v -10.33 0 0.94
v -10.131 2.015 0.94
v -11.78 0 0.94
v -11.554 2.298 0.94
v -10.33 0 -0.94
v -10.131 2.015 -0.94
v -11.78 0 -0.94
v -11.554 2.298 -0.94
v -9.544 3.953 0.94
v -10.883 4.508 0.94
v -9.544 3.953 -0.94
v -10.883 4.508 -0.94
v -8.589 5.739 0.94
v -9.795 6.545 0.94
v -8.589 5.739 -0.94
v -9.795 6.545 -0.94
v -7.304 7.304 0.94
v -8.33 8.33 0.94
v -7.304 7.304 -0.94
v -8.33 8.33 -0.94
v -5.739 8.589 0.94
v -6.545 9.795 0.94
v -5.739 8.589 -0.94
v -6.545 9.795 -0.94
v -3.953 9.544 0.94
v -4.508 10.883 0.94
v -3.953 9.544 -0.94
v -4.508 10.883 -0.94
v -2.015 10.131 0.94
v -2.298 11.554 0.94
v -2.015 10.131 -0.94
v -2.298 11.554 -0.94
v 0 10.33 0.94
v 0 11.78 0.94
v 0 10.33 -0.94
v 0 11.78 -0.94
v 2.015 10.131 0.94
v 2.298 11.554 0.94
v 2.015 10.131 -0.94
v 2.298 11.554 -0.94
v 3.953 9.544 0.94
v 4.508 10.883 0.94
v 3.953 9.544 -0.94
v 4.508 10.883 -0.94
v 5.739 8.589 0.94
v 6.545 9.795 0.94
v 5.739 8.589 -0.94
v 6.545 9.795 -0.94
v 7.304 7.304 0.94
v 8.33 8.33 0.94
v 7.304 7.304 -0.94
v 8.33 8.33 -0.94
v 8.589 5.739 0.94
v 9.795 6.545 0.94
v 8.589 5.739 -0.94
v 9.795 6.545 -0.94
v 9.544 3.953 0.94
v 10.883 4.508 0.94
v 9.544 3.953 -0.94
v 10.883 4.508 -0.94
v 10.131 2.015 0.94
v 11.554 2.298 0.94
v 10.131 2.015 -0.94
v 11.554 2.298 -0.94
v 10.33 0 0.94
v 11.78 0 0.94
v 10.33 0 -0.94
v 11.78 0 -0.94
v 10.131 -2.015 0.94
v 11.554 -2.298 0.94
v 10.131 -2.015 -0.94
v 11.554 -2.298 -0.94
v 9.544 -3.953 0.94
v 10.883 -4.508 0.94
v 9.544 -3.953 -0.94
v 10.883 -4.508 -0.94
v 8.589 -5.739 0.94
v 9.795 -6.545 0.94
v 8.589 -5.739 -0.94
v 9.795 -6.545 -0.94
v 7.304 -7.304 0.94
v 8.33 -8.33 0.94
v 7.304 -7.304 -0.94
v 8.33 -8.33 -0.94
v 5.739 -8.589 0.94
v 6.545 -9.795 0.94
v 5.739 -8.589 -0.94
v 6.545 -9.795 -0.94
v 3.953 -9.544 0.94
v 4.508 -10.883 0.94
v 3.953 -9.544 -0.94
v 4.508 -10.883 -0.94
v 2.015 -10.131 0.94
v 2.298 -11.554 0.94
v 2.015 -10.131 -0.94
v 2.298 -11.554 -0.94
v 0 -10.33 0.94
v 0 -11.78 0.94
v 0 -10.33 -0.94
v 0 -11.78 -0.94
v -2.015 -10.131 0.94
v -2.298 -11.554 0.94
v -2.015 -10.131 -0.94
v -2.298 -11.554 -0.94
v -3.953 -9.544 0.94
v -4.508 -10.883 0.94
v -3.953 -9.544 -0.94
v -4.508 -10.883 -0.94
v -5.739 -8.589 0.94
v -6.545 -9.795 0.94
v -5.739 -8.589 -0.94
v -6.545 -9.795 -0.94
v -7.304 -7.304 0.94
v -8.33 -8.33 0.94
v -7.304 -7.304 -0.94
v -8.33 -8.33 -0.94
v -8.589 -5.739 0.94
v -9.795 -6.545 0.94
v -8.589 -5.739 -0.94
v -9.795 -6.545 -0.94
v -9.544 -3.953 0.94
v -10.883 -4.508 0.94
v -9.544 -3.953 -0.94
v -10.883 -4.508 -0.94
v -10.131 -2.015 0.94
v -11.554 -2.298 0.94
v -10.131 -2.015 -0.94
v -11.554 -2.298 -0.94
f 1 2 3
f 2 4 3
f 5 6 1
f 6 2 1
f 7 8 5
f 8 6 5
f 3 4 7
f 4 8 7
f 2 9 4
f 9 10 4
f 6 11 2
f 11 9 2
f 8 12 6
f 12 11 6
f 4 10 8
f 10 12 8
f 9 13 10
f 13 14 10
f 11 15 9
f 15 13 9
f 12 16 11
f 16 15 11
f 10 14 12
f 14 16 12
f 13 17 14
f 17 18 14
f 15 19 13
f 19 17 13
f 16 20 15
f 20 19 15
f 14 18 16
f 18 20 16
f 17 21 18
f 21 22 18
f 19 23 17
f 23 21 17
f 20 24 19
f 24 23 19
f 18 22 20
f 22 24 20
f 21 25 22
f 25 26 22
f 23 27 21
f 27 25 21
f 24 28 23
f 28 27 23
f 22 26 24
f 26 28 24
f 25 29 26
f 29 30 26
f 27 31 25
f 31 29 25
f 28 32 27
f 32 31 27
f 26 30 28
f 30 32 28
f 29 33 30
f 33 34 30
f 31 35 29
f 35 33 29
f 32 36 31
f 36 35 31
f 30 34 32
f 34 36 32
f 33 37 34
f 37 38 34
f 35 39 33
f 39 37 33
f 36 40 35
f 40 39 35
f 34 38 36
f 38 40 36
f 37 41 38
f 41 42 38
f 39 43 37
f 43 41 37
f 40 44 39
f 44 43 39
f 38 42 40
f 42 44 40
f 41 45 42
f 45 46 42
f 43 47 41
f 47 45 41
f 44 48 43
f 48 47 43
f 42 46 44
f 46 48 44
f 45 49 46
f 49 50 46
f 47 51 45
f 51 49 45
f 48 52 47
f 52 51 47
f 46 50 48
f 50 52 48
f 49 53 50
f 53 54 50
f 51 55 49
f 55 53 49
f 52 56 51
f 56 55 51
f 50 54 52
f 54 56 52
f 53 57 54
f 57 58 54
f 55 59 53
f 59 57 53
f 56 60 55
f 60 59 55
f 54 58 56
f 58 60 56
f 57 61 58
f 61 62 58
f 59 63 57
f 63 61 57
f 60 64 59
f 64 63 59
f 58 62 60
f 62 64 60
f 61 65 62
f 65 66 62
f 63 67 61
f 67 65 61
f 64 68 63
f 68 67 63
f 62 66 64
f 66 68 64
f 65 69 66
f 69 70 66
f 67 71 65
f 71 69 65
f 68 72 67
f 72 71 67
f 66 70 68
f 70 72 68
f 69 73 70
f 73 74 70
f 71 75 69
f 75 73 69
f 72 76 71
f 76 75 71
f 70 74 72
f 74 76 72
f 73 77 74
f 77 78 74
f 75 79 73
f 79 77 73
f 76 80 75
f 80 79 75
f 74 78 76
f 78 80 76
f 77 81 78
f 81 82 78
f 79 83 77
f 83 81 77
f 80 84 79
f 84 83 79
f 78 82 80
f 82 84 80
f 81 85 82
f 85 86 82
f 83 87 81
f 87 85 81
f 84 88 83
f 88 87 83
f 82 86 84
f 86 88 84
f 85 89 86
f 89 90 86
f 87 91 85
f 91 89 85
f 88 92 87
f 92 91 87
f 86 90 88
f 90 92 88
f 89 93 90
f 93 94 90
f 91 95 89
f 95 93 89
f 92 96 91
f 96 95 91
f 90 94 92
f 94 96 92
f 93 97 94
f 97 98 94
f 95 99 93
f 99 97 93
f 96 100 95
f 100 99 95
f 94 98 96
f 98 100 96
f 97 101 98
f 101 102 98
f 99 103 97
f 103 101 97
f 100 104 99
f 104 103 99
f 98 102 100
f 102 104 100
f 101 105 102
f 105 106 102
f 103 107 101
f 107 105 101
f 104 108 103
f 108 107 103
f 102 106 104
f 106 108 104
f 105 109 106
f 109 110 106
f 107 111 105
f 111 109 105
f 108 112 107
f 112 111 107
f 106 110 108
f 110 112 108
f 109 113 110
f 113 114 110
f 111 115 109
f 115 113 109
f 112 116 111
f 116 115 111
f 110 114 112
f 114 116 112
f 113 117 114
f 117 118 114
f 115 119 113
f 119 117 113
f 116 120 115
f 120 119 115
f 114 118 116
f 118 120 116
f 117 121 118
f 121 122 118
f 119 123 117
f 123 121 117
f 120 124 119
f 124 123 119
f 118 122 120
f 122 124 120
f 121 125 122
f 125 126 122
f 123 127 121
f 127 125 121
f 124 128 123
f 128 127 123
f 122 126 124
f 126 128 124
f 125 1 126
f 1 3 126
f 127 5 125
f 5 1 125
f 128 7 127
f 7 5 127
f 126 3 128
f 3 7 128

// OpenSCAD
// file: ../stamp_generated.scad
// AUTO-GENERATED by scripts/Export-OpenScadStl.ps1 - do not edit by hand
// Source: print-stamp-config.json

info_stamp_line1 = "Verminology";
info_stamp_line2 = "Liquid Bait Station";
info_stamp_line3 = "v2.4.1 Prototype";
reservoir_stamp_bottom = false;
station_stamp_bottom = true;
needle_insert_export_stamp_bottom = false;
needle_gasket_export_stamp_bottom = false;
needle_seal_stamp_bottom = false;
// file: needle-insert.scad
// Needle insert + gasket ring modules. Include this (not `use`) so common.scad loads.
// F5 / STL: open this file directly — draws needle_insert() unless needle_insert_as_library is true before include.
// Base: union of two cylinders — bottom 1 mm @ inner_bait_barrier_id, upper 2 mm @ bottom OD − 2 mm (diametric).

include <common.scad>

// TPU torus: relaxed inner R < upper step R, outer R > upper step R. Centered on z=0; mate with translate(…, needle_gasket_assembly_z).
module needle_gasket_ring() {
    ri = needle_gasket_relaxed_inner_r;
    ro = needle_gasket_relaxed_outer_r;
    hz = needle_gasket_relaxed_z_half;
    render_if_needed()
        rotate_extrude(angle = 360, convexity = 4)
            polygon([
                [ri, -hz],
                [ro, -hz],
                [ro, hz],
                [ri, hz],
            ]);
}

// Six flex posts on upper base step (gasket land OD); top barb: two ramps at needle_insert_clip_top_barb_slope_deg, extruded across w.
module needle_insert_retention_clip_top_barb(L, w, h_barb, apex_r) {
    hm = h_barb / 2;
    translate([0, w / 2, 0])
        rotate([90, 0, 0])
            linear_extrude(height = w, convexity = 4)
                polygon([
                    [0, 0],
                    [L, 0],
                    [L + apex_r, hm],
                    [L, h_barb],
                    [0, h_barb],
                ]);
}

module needle_insert_retention_clips() {
    R = needle_insert_gasket_land_od / 2;
    w = needle_insert_clip_tangent_width_mm;
    ad = needle_insert_clip_anchor_depth_mm;
    stem = needle_insert_clip_stem_radial_mm;
    L = ad + stem;
    h_barb = needle_insert_clip_top_barb_h_mm;
    apex_r = needle_insert_clip_top_barb_apex_radial_mm;
    z_step = needle_insert_base_bottom_h;
    z0 = needle_insert_clip_z0_above_gasket_step_mm + needle_insert_clip_stem_bottom_trim_mm;
    z_body_top = needle_insert_clip_body_z_top - z_step;
    z_barb_base = z_body_top - needle_insert_clip_top_barb_drop_mm;
    ri = needle_insert_clip_retention_radial_inset_mm;
    assert(z_barb_base > z0 + 0.05, "barb drop too large vs stem height");
    for (i = [0 : needle_insert_clip_count - 1])
        rotate([0, 0, needle_insert_clip_phase_deg + i * (360 / needle_insert_clip_count)])
            render_if_needed()
                translate([0, 0, z_step])
                    union() {
                        translate([R - L - ri, -w / 2, z0])
                            cube([L, w, z_barb_base - z0]);
                        translate([R - L - ri, 0, z_barb_base])
                            needle_insert_retention_clip_top_barb(L, w, h_barb, apex_r);
                    }
}

// Lower base step — plain cylinder only (no groove, no difference).
module needle_insert_base_bottom_cylinder() {
    cylinder(h = needle_insert_base_bottom_h, d = needle_insert_base_bottom_od);
}

// Upper base step — second cylinder only (stacked on bottom).
module needle_insert_base_upper_cylinder() {
    translate([0, 0, needle_insert_base_bottom_h])
        cylinder(h = needle_insert_base_gasket_step_h, d = needle_insert_gasket_land_od);
}

module needle_insert_channels() {
    // Vertical: from bottom of lateral port up (not through z=0 below lateral).
    vb = max(0, pin_channel_z_bottom);
    vh = pin_top + 0.5 - vb;
    translate([0, 0, vb])
        cylinder(h = vh, d = pin_channel_dia);
    translate([pin_tunnel_x_center, 0, pin_tunnel_z])
        rotate([0, 90, 0])
            cylinder(h = pin_tunnel_reach, d = pin_channel_dia, center = true);
}

// Solid: union(two base cylinders, pin…); channels subtract through the stack.
module needle_insert() {
    sh = pin_top - pin_tip_taper_h - needle_insert_disk_h;
    render_if_needed()
        difference() {
            union() {
                needle_insert_base_bottom_cylinder();
                needle_insert_base_upper_cylinder();
                translate([0, 0, needle_insert_disk_h]) {
                    cylinder(h = sh, d = pin_dia);
                    translate([0, 0, sh])
                        cylinder(h = pin_tip_taper_h, d1 = pin_dia, d2 = pin_tip_od);
                }
                if (needle_insert_retention_clips_enabled)
                    needle_insert_retention_clips();
            }
            needle_insert_channels();
        }
}

// Pocket: max of (bottom OD, land + barb) + clearance — not id2+c+apex as extra (that oversize erased inner barrier ring).
// Capped below inner barrier ring OD so the subtract cannot hollow the full annulus (watertight wall).
module needle_insert_pocket() {
    c = needle_insert_pocket_clearance;
    ze = needle_insert_pocket_z_extra;
    r_body = needle_insert_base_bottom_od / 2 + c;
    r_barb = needle_insert_retention_clips_enabled
        ? needle_insert_gasket_land_od / 2 + needle_insert_clip_top_barb_apex_radial_mm + c
            - needle_insert_clip_retention_radial_inset_mm
        : 0;
    r_need = max(r_body, r_barb);
    r_cap = inner_bait_barrier_od / 2 - needle_insert_pocket_inner_barrier_min_wall_mm;
    r_clip = min(r_need, r_cap);
    assert(r_need <= r_cap + 0.02, "needle pocket exceeds inner barrier OD cap — reduce barb apex or slope");
    z_barb = needle_insert_retention_clips_enabled ? needle_insert_clip_top_barb_h_mm : 0;
    z_drop = needle_insert_retention_clips_enabled ? needle_insert_clip_top_barb_drop_mm : 0;
    z_clip_top = max(
        inner_barrier_rail_z_top + 0.08,
        needle_insert_clip_body_z_top - z_drop + z_barb + needle_insert_pocket_z_above_clip_post_mm);
    translate([0, 0, -0.02])
        union() {
            cylinder(h = z_clip_top + 0.02 + ze, r = r_clip);
            translate([0, 0, z_clip_top])
                cylinder(h = pin_top - z_clip_top + 0.5 + ze, d = pin_dia + 2 * c);
        }
}

if (is_undef(needle_insert_as_library) || !needle_insert_as_library)
    needle_insert();
// main file
// STL export entry — mesh_preview/crosssection overridden by export script.
needle_insert_as_library = true;
include <needle-insert.scad>

needle_gasket_ring();
